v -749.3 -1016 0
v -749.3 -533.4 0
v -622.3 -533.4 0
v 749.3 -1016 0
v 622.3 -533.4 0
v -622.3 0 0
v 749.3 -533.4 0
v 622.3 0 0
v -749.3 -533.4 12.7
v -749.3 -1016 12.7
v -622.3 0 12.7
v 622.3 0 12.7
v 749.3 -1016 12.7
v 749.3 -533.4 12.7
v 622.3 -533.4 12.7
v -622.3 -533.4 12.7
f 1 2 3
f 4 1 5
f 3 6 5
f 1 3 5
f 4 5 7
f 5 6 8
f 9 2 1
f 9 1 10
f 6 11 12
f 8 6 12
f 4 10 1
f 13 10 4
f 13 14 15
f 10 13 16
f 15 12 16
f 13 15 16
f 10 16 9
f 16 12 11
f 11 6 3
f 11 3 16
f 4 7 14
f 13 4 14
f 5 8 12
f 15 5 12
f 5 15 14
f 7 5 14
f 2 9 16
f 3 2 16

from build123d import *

# Parameters (mm, degrees)
F0_W     = 127
F0_H     = 12.7
F1_DEPTH = 1016
F2_DEPTH = 533.4


with BuildPart() as f1:
    # F0 (on Front) → F1 (new body)
    with BuildSketch(Plane.XZ):
        with Locations((-685.8, 6.35)):
            Rectangle(F0_W, F0_H)
        Polygon((-622.3, 0), (0, 0), (622.3, 0), (622.3, 12.7), (-622.3, 12.7), align=None)
        with Locations((685.8, 6.35)):
            Rectangle(F0_W, F0_H)
    extrude(amount=F1_DEPTH)

    # F0 (on Front) → F2 (cut)
    with BuildSketch(Plane.XZ):
        with Locations((-685.8, 6.35)):
            Rectangle(F0_W, F0_H)
        with Locations((685.8, 6.35)):
            Rectangle(F0_W, F0_H)
    extrude(amount=F2_DEPTH, mode=Mode.SUBTRACT)


solid = f1.part
